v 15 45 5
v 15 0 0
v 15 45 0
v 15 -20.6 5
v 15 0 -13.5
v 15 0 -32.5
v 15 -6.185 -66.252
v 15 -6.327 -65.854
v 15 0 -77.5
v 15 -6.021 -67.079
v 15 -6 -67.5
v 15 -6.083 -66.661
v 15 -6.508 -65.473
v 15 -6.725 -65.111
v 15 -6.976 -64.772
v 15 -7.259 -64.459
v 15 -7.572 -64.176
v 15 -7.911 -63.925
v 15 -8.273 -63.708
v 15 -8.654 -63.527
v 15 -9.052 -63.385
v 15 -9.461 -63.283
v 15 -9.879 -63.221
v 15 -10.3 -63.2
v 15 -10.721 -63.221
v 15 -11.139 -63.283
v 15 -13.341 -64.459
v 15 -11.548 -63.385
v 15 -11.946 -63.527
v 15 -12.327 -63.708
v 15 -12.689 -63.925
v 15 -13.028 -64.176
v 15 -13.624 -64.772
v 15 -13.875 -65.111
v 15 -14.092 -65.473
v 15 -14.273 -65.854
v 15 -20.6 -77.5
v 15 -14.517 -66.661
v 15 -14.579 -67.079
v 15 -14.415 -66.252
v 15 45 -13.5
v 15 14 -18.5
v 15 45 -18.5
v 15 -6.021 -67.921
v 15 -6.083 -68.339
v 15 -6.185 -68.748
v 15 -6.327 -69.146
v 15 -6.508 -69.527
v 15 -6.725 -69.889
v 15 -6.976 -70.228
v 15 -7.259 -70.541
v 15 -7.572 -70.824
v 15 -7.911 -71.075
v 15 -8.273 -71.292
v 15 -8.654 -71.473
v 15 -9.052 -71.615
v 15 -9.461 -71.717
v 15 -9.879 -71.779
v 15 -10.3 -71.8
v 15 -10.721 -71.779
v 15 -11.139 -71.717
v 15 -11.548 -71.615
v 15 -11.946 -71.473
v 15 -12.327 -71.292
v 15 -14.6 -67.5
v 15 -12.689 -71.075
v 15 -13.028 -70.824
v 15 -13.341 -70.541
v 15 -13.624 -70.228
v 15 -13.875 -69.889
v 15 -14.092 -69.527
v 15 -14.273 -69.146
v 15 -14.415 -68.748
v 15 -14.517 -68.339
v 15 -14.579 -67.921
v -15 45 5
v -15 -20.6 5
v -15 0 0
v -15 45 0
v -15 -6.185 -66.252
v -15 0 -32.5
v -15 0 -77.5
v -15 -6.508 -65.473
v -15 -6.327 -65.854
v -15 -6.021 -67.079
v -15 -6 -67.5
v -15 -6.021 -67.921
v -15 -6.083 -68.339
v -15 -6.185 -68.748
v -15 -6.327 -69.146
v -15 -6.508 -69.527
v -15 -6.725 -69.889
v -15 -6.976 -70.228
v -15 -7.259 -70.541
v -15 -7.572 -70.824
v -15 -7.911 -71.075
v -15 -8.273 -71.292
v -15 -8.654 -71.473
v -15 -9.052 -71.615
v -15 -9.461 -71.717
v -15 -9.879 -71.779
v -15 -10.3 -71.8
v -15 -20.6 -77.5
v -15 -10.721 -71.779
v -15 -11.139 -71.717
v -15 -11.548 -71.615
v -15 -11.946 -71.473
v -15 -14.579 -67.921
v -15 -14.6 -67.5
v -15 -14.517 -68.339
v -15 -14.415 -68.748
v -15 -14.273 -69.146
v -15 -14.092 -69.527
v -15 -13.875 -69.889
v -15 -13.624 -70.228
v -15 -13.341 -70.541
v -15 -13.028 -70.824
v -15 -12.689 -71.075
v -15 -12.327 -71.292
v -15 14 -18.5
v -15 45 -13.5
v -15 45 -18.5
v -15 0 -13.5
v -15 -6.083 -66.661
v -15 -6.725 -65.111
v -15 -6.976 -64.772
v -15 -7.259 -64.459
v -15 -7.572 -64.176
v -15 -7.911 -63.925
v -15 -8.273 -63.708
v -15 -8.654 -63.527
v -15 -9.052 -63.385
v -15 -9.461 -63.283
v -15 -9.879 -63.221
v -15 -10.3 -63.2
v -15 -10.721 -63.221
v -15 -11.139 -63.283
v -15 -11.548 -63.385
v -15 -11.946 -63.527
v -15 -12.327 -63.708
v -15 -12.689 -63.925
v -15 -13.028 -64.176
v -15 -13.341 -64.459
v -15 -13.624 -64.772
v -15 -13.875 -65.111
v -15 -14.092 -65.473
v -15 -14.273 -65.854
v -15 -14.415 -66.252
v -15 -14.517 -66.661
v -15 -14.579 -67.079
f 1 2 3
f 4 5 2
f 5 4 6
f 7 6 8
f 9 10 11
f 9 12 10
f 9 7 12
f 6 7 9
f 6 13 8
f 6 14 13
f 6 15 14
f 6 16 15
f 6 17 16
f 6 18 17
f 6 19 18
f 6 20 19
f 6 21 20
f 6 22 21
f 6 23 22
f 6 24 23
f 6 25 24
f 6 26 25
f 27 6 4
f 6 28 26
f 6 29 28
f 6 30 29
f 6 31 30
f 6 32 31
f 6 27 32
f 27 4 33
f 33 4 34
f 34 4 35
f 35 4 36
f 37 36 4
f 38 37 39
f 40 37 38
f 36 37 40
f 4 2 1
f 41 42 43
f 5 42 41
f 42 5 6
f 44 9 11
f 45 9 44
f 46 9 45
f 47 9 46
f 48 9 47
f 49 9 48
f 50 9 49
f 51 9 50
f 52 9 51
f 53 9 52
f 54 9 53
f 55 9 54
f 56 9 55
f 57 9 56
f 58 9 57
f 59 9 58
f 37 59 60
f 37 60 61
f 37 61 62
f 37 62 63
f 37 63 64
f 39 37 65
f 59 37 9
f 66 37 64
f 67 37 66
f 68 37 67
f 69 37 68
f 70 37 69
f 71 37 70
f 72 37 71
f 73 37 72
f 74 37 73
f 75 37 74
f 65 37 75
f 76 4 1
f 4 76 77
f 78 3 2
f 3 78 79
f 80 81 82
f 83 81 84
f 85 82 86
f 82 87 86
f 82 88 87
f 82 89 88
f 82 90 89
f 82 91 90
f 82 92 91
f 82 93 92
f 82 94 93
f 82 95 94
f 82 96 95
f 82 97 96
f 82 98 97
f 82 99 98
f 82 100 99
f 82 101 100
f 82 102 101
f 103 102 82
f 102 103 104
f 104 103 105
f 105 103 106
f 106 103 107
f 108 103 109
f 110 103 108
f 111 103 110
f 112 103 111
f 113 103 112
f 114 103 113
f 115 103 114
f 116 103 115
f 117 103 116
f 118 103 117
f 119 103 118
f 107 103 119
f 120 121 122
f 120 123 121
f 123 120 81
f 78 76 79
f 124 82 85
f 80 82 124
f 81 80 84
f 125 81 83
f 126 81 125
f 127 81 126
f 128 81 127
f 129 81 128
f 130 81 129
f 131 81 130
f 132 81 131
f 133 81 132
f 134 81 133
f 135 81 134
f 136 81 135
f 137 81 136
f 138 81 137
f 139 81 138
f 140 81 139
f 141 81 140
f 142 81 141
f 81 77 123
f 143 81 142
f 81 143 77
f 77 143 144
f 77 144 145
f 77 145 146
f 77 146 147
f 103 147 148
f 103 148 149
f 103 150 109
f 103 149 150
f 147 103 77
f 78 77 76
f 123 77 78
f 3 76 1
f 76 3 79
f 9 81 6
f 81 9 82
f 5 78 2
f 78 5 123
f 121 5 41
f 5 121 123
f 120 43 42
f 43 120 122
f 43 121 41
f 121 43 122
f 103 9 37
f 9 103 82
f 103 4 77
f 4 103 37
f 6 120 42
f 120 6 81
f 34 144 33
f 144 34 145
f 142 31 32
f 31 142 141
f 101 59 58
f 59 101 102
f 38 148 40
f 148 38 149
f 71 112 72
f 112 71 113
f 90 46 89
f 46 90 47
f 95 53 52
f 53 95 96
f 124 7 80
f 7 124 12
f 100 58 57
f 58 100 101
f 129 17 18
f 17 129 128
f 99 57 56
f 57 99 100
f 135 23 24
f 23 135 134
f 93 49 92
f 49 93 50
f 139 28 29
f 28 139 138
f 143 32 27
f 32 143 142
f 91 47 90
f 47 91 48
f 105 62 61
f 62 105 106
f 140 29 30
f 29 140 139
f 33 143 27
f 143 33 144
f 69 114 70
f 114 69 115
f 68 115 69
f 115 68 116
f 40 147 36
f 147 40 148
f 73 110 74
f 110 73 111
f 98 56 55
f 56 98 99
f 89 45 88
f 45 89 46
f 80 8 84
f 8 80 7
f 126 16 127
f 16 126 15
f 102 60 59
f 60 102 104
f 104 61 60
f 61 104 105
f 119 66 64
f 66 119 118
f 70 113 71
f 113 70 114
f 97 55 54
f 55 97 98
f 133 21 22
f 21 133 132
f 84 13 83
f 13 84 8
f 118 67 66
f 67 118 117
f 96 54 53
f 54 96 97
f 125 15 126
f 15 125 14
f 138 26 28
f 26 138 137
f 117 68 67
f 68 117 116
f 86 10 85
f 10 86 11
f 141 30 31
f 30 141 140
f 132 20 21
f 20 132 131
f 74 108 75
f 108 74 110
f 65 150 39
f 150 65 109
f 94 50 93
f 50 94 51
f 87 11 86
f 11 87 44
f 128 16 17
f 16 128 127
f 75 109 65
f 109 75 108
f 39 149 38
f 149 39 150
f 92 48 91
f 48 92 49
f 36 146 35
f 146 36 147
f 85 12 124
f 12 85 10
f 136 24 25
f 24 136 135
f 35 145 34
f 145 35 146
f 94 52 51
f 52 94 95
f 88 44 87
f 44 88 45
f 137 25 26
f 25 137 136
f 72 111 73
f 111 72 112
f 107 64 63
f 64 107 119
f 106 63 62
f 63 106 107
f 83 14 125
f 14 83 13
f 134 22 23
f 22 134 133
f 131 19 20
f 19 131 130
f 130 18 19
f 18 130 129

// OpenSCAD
// rod_bracket — shelf-edge clamp carrying an 8 mm rod of tape or wire reels.
// Print TWO (three for a long span).
//
// HOW YOU USE IT:
//   Slide a bracket onto the shelf's front edge at each end. Thread the rod
//   through one, through the reels, into the other. Reels hang below the shelf
//   front; you pull tape straight down. To add a reel, slide the rod out sideways.
//
// WHY IT HOOKS RATHER THAN STICKS: the load self-tightens the grip. Weight on the
// rod tries to rotate the bracket about the shelf's front-bottom edge, which
// pulls the top arm DOWN onto the shelf face. An adhesive pad does the opposite —
// the same rotation peels its front edge, and peel is how pads fail. The hook
// needs no adhesive at all; add some under the top arm only if you want it
// permanent.
//
// WHY A PAIR: two ends means the rod length never has to be known. An 8 mm steel
// rod over 18" with ~600 g of reels sags 0.19 mm, so two is enough.
//
// NO BEARINGS, NO HUBS. Reels ride straight on the rod like a roll on a dowel —
// the 78.5 mm core just rests on the 8 mm rod and turns. The core rubbing the rod
// gives a little drag, which is wanted for wire (a free-spinning spool overruns
// and birdnests) and harmless for tape.
//
// PRINT: flat face on the bed. The bore then prints as a vertical hole with no
// bridge, and the layers run across the pull rather than along it. No supports.
//
// SPDX-License-Identifier: CC-BY-NC-4.0
// Copyright (c) 2026 Aaron Cupp

/* [Shelf] */
SHELF_T   = 12.7;   // [6:0.1:40] shelf thickness — 1/2" ⚠️ MEASURE, user est.
SHELF_CLR = 0.8;    // [0.2:0.1:2] slot clearance, so it slides on
GRIP      = 45.0;   // [20:1:90] how far it reaches back onto the shelf

/* [Rod] */
ROD_D     = 8.0;    // [3:0.5:16] measured
ROD_CLR   = 0.6;    // [0.2:0.1:1.5] it must turn freely, not a bearing fit

/* [Reels] */
REEL_OD   = 92.0;   // [40:1:200] largest reel
CLEAR     = 8.0;    // [3:1:25] gap between reel edge and the shelf underside

/* [Bracket] */
WIDE      = 30.0;   // [15:1:60] bracket width along the shelf edge
ARM       = 5.0;    // [3:0.5:10] arm thickness above and below the shelf
BOSS      = 6.0;    // [4:0.5:10] material around the bore, all round

// Spine thickness is DERIVED from the bore, never set by hand. It was 7 mm
// against an 8.6 mm bore, so the hole cut straight out through both faces and
// left an open channel — a rod would have dropped out. Anything that has to
// contain a hole must be sized from that hole.
SPINE = ROD_D + ROD_CLR + 2*BOSS;

SLOT = SHELF_T + SHELF_CLR;
DROP = REEL_OD/2 + CLEAR;             // shelf underside to rod centre
BOT  = -SLOT - DROP - ROD_D/2 - BOSS; // lowest point

assert(SPINE >= ROD_D + ROD_CLR + 2*3, "Spine too thin to contain the bore.");
echo(str("slot ", SLOT, " for a ", SHELF_T, " shelf; spine ", SPINE,
         " around a ", ROD_D + ROD_CLR, " bore; rod ", DROP,
         " below the shelf; part ", WIDE, " x ", GRIP + SPINE, " x ", ARM - BOT));

difference() {
    union() {
        // top arm — lies on the shelf
        translate([-WIDE/2, 0, 0]) cube([WIDE, GRIP, ARM]);
        // bottom arm — under the shelf, the other jaw
        translate([-WIDE/2, 0, -SLOT - ARM]) cube([WIDE, GRIP, ARM]);
        // front spine — closes the C and carries the load down to the rod
        translate([-WIDE/2, -SPINE, BOT]) cube([WIDE, SPINE, ARM - BOT]);
        // gusset from the spine into the bottom jaw
        translate([-WIDE/2, 0, -SLOT - ARM]) rotate([90, 0, 90])
            linear_extrude(WIDE) polygon([[0, 0], [14, 0], [0, -14]]);
    }
    // rod bore, across the bracket, centred in the spine
    translate([-WIDE, -SPINE/2, -SLOT - DROP]) rotate([0, 90, 0])
        cylinder(d = ROD_D + ROD_CLR, h = 3*WIDE, $fn = 64);
}
